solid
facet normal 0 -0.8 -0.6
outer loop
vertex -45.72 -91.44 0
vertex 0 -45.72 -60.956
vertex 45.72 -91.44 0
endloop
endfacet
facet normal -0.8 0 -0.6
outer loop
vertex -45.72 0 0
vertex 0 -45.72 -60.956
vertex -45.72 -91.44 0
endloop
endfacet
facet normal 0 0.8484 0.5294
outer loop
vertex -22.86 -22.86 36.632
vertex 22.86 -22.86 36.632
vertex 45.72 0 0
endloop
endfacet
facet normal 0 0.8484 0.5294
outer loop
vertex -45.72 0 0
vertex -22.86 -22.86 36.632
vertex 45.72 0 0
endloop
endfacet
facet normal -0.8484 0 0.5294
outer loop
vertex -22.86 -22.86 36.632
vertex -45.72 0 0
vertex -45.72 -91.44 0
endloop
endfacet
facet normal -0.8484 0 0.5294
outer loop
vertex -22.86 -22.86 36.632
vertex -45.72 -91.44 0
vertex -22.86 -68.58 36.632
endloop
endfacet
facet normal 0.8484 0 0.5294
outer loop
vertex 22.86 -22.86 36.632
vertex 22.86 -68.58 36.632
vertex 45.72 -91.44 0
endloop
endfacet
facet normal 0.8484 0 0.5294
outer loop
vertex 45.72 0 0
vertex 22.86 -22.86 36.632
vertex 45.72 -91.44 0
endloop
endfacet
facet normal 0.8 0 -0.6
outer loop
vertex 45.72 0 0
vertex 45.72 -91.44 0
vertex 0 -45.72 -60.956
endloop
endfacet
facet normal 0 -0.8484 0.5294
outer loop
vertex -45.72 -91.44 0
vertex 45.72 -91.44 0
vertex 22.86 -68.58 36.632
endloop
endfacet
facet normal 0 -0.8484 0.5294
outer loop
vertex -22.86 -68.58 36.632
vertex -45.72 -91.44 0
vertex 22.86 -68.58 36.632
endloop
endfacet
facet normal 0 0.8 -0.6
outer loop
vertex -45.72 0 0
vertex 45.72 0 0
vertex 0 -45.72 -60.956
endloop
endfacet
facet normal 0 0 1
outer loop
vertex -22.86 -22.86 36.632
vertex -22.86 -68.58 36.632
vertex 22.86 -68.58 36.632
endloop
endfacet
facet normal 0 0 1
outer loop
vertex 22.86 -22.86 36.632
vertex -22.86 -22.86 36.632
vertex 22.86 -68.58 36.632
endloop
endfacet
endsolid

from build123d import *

# Parameters (mm, degrees)
F0_W     = 91.44
F0_H     = 116.84
F1_DEPTH = 91.44
F4_DEPTH = 127
F5_DEPTH = 152.4


with BuildPart() as f1:
    # F0 (on Front) → F1 (new body)
    with BuildSketch(Plane.XZ):
        with Locations((0, -2.535963)):
            Rectangle(F0_W, F0_H)
    extrude(amount=F1_DEPTH)

    # F2 (on face) → F4 (cut)
    with BuildSketch(Plane.XZ.offset(91.44)):
        Polygon((-45.72, 55.884037), (-45.72, 0), (-22.86, 36.632401), (22.86, 36.632401), (45.72, 0), (45.72, 55.884037), align=None)
        Polygon((45.72, 0), (0, -60.955963), (45.72, -60.955963), align=None)
        Polygon((-45.72, -60.955963), (0, -60.955963), (-45.72, 0), align=None)
    extrude(amount=-F4_DEPTH, mode=Mode.SUBTRACT)

    # F3 (on face) → F5 (cut)
    with BuildSketch(Plane.YZ.offset(45.72)):
        Polygon((-91.44, 55.884037), (-91.44, 0), (-68.58, 36.632401), (-22.86, 36.632401), (0, 0), (0, 55.884037), align=None)
        Polygon((0, 0), (-45.72, -60.955963), (0, -60.955963), align=None)
        Polygon((-91.44, -60.955963), (-45.72, -60.955963), (-91.44, 0), align=None)
    extrude(amount=-F5_DEPTH, mode=Mode.SUBTRACT)


solid = f1.part
